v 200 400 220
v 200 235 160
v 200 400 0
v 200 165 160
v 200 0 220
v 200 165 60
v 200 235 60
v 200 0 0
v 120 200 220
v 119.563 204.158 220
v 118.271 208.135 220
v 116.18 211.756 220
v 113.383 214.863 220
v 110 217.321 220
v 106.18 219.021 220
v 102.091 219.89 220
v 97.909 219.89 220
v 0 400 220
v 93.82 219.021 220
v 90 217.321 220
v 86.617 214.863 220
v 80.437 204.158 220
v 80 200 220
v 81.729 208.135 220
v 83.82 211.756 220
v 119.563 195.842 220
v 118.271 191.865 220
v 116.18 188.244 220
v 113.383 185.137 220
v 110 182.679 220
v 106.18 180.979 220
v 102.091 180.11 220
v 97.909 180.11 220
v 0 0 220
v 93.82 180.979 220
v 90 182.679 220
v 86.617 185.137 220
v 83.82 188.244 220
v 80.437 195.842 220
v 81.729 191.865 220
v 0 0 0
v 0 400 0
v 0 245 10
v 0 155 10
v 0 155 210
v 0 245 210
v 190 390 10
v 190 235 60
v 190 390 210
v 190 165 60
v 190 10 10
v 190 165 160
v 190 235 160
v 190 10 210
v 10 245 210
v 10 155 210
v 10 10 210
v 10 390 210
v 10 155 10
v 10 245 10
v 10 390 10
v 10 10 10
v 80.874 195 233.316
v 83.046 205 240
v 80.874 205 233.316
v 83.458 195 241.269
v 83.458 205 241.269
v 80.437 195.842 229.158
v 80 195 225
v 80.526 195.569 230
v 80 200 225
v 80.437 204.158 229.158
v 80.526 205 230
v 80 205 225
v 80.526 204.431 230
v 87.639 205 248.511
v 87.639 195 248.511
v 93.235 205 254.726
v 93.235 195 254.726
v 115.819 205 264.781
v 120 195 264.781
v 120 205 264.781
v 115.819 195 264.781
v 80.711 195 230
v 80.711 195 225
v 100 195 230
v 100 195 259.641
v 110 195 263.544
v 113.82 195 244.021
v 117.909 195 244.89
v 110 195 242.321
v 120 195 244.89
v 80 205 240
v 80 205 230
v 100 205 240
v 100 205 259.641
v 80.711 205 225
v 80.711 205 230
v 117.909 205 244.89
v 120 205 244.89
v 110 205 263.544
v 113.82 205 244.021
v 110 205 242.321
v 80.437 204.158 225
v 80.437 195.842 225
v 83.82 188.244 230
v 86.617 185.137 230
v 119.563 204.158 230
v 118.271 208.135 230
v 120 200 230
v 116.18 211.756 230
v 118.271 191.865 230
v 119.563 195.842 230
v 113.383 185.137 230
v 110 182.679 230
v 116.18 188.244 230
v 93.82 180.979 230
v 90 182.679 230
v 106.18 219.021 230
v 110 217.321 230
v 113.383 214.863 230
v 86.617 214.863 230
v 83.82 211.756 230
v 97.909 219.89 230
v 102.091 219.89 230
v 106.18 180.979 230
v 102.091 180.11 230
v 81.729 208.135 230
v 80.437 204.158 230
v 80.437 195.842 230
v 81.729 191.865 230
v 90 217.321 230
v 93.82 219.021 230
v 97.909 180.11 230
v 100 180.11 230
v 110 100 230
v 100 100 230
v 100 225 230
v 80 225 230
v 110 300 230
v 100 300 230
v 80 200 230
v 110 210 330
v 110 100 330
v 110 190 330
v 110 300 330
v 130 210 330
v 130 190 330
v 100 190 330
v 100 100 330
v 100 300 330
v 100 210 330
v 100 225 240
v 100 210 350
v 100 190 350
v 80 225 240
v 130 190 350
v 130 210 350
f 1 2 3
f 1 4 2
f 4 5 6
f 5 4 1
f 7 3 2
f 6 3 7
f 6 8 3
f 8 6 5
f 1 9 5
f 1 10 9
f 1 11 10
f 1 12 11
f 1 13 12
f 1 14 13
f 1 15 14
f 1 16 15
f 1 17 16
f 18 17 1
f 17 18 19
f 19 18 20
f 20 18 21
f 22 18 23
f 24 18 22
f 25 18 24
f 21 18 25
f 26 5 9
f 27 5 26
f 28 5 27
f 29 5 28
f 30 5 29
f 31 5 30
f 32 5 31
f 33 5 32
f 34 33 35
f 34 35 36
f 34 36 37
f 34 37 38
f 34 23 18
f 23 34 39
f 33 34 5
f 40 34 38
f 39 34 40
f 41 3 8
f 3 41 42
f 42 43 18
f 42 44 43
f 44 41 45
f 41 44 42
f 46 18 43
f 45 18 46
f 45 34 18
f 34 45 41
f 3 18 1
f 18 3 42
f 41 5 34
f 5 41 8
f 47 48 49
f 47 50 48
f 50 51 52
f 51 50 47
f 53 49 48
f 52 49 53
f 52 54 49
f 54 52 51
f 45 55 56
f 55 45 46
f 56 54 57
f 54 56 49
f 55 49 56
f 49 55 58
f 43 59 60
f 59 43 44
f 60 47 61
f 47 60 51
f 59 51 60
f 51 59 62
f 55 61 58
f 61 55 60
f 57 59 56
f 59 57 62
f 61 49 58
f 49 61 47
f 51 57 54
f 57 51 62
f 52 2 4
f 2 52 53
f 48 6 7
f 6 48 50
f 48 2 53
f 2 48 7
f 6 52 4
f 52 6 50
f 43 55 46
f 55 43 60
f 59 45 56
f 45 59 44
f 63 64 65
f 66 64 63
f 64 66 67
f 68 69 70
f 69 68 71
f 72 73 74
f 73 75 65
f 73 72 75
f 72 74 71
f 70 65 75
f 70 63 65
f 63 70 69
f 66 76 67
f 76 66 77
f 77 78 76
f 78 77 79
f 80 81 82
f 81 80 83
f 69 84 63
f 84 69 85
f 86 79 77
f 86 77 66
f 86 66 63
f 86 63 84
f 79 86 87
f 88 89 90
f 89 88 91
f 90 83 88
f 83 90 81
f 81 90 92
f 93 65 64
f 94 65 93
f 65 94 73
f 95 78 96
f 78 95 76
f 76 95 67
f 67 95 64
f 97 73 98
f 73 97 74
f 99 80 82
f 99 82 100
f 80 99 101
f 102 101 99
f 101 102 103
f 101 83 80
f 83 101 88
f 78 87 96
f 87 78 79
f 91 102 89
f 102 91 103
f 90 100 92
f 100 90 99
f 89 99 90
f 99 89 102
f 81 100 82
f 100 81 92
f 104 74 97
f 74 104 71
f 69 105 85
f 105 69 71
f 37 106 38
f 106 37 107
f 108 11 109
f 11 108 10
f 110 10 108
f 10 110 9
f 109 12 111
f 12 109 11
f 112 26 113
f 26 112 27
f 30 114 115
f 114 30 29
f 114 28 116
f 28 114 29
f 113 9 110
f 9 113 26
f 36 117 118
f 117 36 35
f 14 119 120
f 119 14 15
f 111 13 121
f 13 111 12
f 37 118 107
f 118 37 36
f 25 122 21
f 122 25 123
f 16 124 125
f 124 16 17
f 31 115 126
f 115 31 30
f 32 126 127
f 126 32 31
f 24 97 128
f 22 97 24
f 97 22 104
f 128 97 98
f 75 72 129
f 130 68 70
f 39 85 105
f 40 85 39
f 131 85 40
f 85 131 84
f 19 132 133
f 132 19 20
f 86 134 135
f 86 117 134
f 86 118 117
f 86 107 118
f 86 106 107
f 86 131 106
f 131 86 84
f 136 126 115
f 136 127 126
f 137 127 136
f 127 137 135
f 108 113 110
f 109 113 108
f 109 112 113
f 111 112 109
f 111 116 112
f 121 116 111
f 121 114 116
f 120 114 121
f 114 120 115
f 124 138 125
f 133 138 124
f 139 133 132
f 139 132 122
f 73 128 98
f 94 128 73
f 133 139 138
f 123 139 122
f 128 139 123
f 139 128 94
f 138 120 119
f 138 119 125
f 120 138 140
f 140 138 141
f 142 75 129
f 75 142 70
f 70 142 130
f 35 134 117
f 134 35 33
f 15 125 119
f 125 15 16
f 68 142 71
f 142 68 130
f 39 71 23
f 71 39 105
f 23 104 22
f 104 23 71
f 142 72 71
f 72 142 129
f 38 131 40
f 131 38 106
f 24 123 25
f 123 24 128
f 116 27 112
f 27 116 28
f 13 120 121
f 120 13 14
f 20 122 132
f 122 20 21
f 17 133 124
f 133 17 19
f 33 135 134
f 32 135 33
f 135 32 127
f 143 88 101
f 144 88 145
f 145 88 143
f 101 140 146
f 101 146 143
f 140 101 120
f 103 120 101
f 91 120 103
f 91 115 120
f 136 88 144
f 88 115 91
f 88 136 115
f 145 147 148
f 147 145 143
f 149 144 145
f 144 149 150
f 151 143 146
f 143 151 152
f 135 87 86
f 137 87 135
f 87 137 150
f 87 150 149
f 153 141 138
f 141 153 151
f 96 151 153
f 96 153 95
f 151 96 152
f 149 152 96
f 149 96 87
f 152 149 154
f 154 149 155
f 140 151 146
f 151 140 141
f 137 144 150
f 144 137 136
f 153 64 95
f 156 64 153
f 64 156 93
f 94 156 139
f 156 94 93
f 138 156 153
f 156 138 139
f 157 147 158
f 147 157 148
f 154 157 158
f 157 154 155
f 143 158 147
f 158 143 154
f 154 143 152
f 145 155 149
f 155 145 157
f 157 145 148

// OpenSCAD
wagenHoehe = 220;
wagenBreite = 200;
wagenLaenge = 400;
wagenWallThickness = 10;

SolarUnitYawRingHight = 10;
SolarUnitYawRingRadius = 20;

SolarUnitPitchRingHight = 10;
solarUnitPitchRingRadius = 40;
SolarUnitPitchRingThickness = 20;

windowHight = 100;
windowWidth = 70;

doorWidth = 90;
doorHight = 200;

// wagen primitive
difference() { 
    difference() {
        cube([wagenBreite, wagenLaenge, wagenHoehe]);
        translate([wagenWallThickness, wagenWallThickness, wagenWallThickness]) {
            cube([wagenBreite - 2* wagenWallThickness,wagenLaenge - 2* wagenWallThickness, wagenHoehe - 2* wagenWallThickness]);
        }
    }
    //window
    translate([wagenBreite-wagenWallThickness-1, wagenLaenge/2 -windowWidth/2, wagenHoehe/2-windowHight/2]) {
        cube([wagenWallThickness+2, windowWidth, windowHight]);
    }
    //door
    translate([-1, wagenLaenge/2 -doorWidth/2, wagenHoehe/2-doorHight/2]) {
        cube([wagenWallThickness+2, doorWidth, doorHight]);
    }
}

// cube([wagenBreite,wagenLaenge,wagenHoehe]);

// translate to roof center
translate([wagenBreite/2,wagenLaenge/2,wagenHoehe + SolarUnitYawRingHight/2]) {
    // movement ring for pannel assembly yaw
    cylinder(h = SolarUnitYawRingHight, r= SolarUnitYawRingRadius, center = true);

    // solar pannel placeholder (SolarUnitSolarPanel)
    translate([SolarUnitYawRingRadius-20,-100,5]) {
        cube([10,200,100]);
    }
     // motor assmbly for yaw(SolarUnitYawMovementBox)
    translate([0,SolarUnitYawRingRadius/2,SolarUnitYawRingHight/2]) {
        cube([10,20,20]);
    }
    // motor assemblyfor pitch(SolarUnitPitchMovementBox)
    translate([-solarUnitPitchRingRadius/2 ,SolarUnitPitchRingHight/2,SolarUnitYawRingHight/2]) {
        cube([20,20,10]);
    } 
    // solar position esp enclosure
    translate([0,-10,105]) {
        cube([30,20,20]);
    }

    // quater ring for Pitch (SolarUnitPitchMovementRing) / villeicht besser ein kniehebel...?
    translate([solarUnitPitchRingRadius/2, 0, 0]) {
        rotate([90,0,180]) {
            intersection(){
                difference() {    
                    cylinder(h=SolarUnitPitchRingHight, r=solarUnitPitchRingRadius, center=true);
                    cylinder(h=SolarUnitPitchRingHight+1, r=solarUnitPitchRingRadius-SolarUnitPitchRingThickness, center=true);
                }
                translate([0,0,-SolarUnitPitchRingHight/2-1]){
                    cube([solarUnitPitchRingRadius,solarUnitPitchRingRadius,SolarUnitPitchRingHight+2]);
                }
            }
        }
    }
}
